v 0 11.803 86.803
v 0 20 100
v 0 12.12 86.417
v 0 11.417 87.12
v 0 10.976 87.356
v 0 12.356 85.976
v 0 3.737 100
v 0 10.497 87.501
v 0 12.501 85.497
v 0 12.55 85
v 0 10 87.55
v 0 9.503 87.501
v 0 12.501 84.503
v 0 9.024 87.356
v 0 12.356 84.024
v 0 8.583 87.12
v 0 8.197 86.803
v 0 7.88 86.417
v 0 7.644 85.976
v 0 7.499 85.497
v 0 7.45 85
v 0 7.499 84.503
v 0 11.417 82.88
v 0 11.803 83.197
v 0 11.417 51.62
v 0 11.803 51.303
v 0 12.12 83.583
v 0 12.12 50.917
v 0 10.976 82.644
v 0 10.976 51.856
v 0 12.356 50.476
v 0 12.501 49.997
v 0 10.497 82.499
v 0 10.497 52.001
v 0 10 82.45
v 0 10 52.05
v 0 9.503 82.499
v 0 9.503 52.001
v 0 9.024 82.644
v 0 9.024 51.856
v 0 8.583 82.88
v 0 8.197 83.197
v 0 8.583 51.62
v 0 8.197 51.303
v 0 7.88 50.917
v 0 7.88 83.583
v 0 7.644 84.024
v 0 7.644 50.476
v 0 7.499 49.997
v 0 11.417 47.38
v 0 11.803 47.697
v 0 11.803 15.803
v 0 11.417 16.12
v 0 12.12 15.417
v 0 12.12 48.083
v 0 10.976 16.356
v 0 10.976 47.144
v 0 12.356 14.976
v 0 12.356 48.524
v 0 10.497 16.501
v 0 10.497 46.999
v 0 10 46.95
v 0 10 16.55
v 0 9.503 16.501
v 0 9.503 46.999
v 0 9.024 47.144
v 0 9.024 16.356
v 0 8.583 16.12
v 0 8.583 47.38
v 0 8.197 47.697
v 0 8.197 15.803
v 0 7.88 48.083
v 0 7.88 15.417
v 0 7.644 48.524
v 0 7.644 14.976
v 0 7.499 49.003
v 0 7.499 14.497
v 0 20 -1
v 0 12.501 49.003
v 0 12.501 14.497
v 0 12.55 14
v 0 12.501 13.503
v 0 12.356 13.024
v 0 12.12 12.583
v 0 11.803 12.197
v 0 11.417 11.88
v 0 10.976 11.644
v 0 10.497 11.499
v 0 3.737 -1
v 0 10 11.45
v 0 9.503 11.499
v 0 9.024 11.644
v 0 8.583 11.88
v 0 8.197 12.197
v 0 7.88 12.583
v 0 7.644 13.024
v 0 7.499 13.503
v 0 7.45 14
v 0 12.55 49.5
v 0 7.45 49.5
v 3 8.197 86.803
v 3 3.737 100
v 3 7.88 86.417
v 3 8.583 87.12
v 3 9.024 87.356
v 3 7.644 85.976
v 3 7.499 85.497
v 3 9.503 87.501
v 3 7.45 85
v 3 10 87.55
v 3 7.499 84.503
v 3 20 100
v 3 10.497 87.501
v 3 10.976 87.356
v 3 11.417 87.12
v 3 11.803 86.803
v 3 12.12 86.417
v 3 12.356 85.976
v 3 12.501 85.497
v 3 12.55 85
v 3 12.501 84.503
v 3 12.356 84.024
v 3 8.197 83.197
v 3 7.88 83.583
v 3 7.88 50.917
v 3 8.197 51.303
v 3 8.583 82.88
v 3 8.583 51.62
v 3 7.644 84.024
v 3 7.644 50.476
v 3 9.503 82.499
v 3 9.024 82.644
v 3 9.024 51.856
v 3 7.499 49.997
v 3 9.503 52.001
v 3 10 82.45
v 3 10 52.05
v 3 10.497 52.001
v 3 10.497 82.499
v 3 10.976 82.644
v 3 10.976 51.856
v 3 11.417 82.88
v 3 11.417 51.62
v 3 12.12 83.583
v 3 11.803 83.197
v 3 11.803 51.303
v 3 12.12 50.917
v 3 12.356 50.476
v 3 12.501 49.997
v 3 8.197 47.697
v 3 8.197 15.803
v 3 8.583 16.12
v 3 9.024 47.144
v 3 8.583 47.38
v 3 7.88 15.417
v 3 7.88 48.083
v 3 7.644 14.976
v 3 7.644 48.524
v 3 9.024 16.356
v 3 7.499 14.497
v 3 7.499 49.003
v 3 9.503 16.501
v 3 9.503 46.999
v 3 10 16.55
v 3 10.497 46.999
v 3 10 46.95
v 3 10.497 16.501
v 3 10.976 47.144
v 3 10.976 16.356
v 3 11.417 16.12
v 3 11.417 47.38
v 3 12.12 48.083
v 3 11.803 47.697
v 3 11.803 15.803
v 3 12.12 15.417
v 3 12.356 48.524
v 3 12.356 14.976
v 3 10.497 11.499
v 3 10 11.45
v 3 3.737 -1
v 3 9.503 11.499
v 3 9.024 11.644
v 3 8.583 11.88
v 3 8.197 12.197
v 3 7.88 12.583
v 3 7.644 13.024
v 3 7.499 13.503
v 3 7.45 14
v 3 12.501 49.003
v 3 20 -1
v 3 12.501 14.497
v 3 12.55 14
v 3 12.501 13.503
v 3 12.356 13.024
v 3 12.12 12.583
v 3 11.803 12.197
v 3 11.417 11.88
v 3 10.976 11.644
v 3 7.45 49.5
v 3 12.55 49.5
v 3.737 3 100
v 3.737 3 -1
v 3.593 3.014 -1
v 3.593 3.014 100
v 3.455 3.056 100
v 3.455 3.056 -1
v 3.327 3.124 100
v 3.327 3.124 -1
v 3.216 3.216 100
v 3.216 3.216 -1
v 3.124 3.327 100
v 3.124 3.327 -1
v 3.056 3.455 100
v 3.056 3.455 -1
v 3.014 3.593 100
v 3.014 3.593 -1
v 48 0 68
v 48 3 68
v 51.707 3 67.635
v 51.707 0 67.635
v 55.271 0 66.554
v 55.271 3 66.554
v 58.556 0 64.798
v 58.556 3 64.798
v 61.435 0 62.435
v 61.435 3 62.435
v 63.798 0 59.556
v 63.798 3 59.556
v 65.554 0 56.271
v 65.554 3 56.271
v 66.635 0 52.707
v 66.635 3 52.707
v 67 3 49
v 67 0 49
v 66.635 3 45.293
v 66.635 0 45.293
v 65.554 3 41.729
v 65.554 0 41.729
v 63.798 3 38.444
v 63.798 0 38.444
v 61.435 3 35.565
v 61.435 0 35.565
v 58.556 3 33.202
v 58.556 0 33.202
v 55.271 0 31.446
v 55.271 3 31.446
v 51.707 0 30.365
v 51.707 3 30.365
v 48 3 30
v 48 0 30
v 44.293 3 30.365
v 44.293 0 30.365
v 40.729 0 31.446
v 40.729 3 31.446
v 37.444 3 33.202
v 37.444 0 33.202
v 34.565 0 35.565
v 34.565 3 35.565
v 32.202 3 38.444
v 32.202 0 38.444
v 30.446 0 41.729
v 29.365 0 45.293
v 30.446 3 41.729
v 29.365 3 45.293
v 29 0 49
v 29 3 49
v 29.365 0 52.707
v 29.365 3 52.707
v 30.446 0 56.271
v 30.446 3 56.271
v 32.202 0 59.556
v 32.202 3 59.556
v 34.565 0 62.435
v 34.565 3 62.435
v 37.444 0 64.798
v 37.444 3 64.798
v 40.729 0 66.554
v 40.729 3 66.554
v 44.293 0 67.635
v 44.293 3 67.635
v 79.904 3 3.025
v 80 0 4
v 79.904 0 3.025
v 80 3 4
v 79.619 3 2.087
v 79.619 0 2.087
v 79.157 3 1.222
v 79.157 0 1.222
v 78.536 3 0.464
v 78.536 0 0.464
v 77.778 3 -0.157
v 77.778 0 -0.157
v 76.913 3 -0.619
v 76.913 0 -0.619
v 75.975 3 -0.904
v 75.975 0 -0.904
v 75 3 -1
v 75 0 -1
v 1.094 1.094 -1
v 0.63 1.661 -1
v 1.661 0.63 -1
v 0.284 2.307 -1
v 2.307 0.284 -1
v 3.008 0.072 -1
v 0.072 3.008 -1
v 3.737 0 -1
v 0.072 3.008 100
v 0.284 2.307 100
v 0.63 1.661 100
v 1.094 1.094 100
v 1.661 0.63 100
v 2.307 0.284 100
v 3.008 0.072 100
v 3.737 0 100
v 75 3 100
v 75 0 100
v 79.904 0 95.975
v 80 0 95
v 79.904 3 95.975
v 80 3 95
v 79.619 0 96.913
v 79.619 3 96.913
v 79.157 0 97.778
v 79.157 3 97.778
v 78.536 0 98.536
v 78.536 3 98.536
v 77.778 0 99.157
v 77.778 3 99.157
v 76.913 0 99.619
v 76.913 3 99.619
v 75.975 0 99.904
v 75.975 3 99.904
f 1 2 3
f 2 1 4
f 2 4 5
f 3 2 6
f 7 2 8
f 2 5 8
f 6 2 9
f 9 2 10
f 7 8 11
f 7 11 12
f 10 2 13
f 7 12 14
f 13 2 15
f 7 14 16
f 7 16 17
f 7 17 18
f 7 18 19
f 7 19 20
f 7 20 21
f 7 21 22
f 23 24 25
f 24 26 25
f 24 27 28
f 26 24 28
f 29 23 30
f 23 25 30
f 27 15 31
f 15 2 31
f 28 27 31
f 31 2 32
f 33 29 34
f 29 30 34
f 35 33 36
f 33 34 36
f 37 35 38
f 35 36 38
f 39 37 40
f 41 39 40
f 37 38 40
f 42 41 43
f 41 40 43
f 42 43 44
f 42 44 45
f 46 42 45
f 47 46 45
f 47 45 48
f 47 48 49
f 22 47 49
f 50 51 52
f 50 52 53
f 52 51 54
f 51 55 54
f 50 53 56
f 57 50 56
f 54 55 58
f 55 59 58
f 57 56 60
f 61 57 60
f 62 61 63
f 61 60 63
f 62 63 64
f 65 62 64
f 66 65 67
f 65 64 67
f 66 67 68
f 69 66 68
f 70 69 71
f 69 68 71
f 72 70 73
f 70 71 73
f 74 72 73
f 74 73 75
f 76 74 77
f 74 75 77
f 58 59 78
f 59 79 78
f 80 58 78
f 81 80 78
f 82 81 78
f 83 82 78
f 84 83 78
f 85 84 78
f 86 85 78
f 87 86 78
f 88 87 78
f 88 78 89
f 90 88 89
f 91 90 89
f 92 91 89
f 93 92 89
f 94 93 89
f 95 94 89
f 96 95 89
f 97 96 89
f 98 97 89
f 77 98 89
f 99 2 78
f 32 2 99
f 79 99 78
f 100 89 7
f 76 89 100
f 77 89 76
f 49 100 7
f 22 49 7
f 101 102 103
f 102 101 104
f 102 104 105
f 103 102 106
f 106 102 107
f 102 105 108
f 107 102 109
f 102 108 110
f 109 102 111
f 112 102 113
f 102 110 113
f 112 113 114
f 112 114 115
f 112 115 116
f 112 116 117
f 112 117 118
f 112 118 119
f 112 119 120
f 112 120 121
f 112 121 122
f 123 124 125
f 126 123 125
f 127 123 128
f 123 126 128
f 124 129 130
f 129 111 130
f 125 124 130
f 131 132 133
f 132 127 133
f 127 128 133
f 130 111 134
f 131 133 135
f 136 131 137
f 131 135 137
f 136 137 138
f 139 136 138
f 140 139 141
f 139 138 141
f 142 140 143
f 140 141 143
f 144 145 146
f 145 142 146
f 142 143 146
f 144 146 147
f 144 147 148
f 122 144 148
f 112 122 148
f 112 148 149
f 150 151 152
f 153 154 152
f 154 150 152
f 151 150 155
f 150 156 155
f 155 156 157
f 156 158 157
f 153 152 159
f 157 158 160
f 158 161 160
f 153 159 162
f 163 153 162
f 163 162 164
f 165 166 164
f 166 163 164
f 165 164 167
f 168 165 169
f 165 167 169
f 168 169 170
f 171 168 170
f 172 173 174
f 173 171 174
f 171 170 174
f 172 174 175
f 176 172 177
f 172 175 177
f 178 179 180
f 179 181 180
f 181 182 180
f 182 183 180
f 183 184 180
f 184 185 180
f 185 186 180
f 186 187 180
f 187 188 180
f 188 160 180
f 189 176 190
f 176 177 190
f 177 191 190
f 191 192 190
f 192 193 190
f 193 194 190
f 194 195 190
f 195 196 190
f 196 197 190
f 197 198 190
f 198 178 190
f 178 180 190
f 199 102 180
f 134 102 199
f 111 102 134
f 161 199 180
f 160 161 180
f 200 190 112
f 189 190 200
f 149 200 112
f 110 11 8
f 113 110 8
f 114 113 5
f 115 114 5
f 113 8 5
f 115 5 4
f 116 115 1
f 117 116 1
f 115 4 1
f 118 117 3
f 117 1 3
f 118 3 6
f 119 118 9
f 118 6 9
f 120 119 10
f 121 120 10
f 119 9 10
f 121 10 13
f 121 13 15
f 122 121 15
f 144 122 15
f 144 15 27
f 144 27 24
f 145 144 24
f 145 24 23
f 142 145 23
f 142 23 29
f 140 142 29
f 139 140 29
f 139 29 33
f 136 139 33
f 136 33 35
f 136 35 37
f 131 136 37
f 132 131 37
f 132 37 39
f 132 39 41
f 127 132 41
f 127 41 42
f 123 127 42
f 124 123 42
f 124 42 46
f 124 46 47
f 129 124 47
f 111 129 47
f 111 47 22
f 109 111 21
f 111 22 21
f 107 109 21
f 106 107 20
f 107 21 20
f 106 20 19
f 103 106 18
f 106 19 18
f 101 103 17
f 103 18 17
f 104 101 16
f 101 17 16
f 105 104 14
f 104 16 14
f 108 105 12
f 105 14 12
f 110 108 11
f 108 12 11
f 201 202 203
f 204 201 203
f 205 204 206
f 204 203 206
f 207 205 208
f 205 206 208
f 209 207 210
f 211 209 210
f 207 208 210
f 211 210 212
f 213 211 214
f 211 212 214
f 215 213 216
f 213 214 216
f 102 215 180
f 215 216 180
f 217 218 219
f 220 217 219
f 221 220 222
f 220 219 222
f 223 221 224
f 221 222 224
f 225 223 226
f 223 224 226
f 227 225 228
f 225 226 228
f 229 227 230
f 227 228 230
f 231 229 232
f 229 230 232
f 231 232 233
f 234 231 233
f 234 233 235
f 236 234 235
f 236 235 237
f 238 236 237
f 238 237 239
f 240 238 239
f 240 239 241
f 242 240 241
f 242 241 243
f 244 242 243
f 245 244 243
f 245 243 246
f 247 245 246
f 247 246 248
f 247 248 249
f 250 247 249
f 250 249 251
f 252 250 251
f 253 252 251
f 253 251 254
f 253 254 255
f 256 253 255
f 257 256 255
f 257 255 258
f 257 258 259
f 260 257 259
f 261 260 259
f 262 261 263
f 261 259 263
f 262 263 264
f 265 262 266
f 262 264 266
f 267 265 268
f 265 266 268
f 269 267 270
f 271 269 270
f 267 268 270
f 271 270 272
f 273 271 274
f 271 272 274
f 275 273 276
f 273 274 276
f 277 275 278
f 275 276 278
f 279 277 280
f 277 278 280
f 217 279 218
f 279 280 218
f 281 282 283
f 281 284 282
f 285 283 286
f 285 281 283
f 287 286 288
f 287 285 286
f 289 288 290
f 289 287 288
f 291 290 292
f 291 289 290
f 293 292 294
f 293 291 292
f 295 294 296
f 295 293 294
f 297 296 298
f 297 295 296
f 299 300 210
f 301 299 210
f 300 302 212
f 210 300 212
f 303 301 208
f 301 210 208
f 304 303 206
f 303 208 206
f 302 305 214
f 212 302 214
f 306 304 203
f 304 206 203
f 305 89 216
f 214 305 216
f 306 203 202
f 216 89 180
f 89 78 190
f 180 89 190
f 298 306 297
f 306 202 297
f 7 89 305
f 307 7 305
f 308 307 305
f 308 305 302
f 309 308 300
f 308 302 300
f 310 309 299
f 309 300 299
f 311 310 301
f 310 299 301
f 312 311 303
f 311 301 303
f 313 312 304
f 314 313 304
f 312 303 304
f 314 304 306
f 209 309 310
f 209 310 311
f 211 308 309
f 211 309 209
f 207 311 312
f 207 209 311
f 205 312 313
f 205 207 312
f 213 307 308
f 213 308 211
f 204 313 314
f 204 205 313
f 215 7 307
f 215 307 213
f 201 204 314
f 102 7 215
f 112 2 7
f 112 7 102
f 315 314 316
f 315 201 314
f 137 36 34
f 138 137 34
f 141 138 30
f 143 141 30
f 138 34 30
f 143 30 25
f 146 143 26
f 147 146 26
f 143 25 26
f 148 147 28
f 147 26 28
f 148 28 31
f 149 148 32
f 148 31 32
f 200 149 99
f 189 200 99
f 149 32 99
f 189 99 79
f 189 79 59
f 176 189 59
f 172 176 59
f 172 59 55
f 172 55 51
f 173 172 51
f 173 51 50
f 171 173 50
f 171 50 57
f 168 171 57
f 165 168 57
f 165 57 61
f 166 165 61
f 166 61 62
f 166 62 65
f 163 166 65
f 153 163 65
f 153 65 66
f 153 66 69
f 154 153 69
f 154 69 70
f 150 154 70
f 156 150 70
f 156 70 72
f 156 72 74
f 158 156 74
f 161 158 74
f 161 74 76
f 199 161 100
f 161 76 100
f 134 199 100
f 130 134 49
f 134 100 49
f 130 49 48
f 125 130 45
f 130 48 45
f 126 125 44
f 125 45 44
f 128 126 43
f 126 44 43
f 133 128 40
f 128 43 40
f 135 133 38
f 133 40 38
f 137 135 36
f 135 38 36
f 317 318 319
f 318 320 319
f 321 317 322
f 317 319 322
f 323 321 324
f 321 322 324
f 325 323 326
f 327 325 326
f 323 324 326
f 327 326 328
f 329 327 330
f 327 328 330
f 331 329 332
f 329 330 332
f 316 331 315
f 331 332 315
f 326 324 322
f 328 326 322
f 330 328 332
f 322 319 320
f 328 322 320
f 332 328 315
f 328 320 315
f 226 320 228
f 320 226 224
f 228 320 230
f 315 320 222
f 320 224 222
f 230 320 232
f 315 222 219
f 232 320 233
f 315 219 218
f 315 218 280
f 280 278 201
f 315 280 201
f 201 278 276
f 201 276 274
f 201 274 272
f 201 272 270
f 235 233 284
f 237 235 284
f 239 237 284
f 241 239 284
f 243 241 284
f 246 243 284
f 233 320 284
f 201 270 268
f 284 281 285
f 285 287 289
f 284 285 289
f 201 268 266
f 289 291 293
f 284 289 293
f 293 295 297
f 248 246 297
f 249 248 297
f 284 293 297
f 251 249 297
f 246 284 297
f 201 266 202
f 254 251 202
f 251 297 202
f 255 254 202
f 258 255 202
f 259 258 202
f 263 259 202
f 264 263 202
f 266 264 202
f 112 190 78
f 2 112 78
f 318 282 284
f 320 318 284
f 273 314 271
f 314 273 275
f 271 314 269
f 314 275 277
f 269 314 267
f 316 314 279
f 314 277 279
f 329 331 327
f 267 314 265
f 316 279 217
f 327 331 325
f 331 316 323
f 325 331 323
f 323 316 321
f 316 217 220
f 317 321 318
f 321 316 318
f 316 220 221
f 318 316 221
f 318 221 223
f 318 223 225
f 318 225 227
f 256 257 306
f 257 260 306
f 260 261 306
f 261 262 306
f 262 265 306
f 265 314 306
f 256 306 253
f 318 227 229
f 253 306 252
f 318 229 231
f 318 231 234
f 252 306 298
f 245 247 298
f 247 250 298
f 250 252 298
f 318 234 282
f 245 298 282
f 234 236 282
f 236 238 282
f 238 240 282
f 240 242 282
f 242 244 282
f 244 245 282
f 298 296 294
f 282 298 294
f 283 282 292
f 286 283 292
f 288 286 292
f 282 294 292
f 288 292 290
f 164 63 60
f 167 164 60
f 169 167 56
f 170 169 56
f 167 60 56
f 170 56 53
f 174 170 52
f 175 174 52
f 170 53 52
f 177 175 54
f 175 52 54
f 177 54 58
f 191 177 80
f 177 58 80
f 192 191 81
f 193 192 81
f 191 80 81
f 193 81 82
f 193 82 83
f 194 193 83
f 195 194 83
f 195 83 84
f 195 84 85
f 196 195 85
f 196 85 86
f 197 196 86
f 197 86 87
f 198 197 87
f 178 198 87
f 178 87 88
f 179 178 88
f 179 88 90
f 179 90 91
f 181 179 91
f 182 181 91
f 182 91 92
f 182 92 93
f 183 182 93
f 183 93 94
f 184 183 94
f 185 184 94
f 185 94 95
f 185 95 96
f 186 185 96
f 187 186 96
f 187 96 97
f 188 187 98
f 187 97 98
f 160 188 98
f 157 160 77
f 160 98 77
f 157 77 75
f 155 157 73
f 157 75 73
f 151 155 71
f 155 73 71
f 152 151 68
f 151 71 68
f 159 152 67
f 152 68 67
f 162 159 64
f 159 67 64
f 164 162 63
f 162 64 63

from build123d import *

# Parameters (mm, degrees)
BASE_FLANGE1_DEPTH      = 100
BASE_FLANGE1_DEPTH_BACK = 1
FILLET1_R               = 5
CUT_EXTRUDE1_REACH      = 131.186
SKETCH2_R               = 19
CUT_EXTRUDE2_REACH      = 131.615
SKETCH3_R               = 2.55


# Sheet-metal steps are written as plain solids
with BuildPart() as part:
    # Sketch1 → Base-Flange1 (new, two sides: drawn at the far end of the back side and taken through both)
    with BuildSketch(Plane.XY.offset(-BASE_FLANGE1_DEPTH_BACK)):
        with BuildLine():
            Line((0, 20), (0, 3.7366))
            ThreePointArc((0, 3.7366), (1.094424801, 1.094424801), (3.7366, 0))
            Line((3.7366, 0), (80, 0))
            Line((80, 0), (80, 3))
            Line((80, 3), (3.7366, 3))
            ThreePointArc((3.7366, 3), (3.215745145, 3.215745145), (3, 3.7366))
            Line((3, 3.7366), (3, 20))
            Line((3, 20), (0, 20))
        make_face()
    extrude(amount=BASE_FLANGE1_DEPTH + BASE_FLANGE1_DEPTH_BACK)

    # Fillet1
    fillet1_edges = [part.edges().sort_by_distance(p)[0] for p in [
        (80, 1.5, -1),
        (80, 1.5, 100),
    ]]
    fillet(fillet1_edges, radius=FILLET1_R)

    # Sketch2 → Cut-Extrude1 (cut, up to next)
    with BuildSketch(Plane(origin=(0, 3, 0), x_dir=(1, 0, 0), z_dir=(0, 1, 0)), mode=Mode.PRIVATE) as cut_extrude1_sk1:
        with Locations(Location((48, -49, 0), (0, 0, 270))):
            Circle(SKETCH2_R)
    cut_extrude1_tool1 = extrude(cut_extrude1_sk1.sketch, amount=-CUT_EXTRUDE1_REACH, mode=Mode.PRIVATE) & part.part
    add(cut_extrude1_tool1.solids().sort_by_distance((48, 3, 49))[0], mode=Mode.SUBTRACT)

    # Sketch3 → Cut-Extrude2 (cut, up to next)
    with BuildSketch(Plane.ZY, mode=Mode.PRIVATE) as cut_extrude2_sk1:
        with Locations((14, 10)):
            Circle(SKETCH3_R)
    cut_extrude2_tool1 = extrude(cut_extrude2_sk1.sketch, amount=-CUT_EXTRUDE2_REACH, mode=Mode.PRIVATE) & part.part
    # Sketch3 → Cut-Extrude2 (cut, up to next)
    with BuildSketch(Plane.ZY, mode=Mode.PRIVATE) as cut_extrude2_sk2:
        with Locations((49.5, 10)):
            Circle(SKETCH3_R)
    cut_extrude2_tool2 = extrude(cut_extrude2_sk2.sketch, amount=-CUT_EXTRUDE2_REACH, mode=Mode.PRIVATE) & part.part
    # Sketch3 → Cut-Extrude2 (cut, up to next)
    with BuildSketch(Plane.ZY, mode=Mode.PRIVATE) as cut_extrude2_sk3:
        with Locations((85, 10)):
            Circle(SKETCH3_R)
    cut_extrude2_tool3 = extrude(cut_extrude2_sk3.sketch, amount=-CUT_EXTRUDE2_REACH, mode=Mode.PRIVATE) & part.part
    add(cut_extrude2_tool1.solids().sort_by_distance((0, 10, 14))[0], mode=Mode.SUBTRACT)
    add(cut_extrude2_tool2.solids().sort_by_distance((0, 10, 49.5))[0], mode=Mode.SUBTRACT)
    add(cut_extrude2_tool3.solids().sort_by_distance((0, 10, 85))[0], mode=Mode.SUBTRACT)


solid = part.part
